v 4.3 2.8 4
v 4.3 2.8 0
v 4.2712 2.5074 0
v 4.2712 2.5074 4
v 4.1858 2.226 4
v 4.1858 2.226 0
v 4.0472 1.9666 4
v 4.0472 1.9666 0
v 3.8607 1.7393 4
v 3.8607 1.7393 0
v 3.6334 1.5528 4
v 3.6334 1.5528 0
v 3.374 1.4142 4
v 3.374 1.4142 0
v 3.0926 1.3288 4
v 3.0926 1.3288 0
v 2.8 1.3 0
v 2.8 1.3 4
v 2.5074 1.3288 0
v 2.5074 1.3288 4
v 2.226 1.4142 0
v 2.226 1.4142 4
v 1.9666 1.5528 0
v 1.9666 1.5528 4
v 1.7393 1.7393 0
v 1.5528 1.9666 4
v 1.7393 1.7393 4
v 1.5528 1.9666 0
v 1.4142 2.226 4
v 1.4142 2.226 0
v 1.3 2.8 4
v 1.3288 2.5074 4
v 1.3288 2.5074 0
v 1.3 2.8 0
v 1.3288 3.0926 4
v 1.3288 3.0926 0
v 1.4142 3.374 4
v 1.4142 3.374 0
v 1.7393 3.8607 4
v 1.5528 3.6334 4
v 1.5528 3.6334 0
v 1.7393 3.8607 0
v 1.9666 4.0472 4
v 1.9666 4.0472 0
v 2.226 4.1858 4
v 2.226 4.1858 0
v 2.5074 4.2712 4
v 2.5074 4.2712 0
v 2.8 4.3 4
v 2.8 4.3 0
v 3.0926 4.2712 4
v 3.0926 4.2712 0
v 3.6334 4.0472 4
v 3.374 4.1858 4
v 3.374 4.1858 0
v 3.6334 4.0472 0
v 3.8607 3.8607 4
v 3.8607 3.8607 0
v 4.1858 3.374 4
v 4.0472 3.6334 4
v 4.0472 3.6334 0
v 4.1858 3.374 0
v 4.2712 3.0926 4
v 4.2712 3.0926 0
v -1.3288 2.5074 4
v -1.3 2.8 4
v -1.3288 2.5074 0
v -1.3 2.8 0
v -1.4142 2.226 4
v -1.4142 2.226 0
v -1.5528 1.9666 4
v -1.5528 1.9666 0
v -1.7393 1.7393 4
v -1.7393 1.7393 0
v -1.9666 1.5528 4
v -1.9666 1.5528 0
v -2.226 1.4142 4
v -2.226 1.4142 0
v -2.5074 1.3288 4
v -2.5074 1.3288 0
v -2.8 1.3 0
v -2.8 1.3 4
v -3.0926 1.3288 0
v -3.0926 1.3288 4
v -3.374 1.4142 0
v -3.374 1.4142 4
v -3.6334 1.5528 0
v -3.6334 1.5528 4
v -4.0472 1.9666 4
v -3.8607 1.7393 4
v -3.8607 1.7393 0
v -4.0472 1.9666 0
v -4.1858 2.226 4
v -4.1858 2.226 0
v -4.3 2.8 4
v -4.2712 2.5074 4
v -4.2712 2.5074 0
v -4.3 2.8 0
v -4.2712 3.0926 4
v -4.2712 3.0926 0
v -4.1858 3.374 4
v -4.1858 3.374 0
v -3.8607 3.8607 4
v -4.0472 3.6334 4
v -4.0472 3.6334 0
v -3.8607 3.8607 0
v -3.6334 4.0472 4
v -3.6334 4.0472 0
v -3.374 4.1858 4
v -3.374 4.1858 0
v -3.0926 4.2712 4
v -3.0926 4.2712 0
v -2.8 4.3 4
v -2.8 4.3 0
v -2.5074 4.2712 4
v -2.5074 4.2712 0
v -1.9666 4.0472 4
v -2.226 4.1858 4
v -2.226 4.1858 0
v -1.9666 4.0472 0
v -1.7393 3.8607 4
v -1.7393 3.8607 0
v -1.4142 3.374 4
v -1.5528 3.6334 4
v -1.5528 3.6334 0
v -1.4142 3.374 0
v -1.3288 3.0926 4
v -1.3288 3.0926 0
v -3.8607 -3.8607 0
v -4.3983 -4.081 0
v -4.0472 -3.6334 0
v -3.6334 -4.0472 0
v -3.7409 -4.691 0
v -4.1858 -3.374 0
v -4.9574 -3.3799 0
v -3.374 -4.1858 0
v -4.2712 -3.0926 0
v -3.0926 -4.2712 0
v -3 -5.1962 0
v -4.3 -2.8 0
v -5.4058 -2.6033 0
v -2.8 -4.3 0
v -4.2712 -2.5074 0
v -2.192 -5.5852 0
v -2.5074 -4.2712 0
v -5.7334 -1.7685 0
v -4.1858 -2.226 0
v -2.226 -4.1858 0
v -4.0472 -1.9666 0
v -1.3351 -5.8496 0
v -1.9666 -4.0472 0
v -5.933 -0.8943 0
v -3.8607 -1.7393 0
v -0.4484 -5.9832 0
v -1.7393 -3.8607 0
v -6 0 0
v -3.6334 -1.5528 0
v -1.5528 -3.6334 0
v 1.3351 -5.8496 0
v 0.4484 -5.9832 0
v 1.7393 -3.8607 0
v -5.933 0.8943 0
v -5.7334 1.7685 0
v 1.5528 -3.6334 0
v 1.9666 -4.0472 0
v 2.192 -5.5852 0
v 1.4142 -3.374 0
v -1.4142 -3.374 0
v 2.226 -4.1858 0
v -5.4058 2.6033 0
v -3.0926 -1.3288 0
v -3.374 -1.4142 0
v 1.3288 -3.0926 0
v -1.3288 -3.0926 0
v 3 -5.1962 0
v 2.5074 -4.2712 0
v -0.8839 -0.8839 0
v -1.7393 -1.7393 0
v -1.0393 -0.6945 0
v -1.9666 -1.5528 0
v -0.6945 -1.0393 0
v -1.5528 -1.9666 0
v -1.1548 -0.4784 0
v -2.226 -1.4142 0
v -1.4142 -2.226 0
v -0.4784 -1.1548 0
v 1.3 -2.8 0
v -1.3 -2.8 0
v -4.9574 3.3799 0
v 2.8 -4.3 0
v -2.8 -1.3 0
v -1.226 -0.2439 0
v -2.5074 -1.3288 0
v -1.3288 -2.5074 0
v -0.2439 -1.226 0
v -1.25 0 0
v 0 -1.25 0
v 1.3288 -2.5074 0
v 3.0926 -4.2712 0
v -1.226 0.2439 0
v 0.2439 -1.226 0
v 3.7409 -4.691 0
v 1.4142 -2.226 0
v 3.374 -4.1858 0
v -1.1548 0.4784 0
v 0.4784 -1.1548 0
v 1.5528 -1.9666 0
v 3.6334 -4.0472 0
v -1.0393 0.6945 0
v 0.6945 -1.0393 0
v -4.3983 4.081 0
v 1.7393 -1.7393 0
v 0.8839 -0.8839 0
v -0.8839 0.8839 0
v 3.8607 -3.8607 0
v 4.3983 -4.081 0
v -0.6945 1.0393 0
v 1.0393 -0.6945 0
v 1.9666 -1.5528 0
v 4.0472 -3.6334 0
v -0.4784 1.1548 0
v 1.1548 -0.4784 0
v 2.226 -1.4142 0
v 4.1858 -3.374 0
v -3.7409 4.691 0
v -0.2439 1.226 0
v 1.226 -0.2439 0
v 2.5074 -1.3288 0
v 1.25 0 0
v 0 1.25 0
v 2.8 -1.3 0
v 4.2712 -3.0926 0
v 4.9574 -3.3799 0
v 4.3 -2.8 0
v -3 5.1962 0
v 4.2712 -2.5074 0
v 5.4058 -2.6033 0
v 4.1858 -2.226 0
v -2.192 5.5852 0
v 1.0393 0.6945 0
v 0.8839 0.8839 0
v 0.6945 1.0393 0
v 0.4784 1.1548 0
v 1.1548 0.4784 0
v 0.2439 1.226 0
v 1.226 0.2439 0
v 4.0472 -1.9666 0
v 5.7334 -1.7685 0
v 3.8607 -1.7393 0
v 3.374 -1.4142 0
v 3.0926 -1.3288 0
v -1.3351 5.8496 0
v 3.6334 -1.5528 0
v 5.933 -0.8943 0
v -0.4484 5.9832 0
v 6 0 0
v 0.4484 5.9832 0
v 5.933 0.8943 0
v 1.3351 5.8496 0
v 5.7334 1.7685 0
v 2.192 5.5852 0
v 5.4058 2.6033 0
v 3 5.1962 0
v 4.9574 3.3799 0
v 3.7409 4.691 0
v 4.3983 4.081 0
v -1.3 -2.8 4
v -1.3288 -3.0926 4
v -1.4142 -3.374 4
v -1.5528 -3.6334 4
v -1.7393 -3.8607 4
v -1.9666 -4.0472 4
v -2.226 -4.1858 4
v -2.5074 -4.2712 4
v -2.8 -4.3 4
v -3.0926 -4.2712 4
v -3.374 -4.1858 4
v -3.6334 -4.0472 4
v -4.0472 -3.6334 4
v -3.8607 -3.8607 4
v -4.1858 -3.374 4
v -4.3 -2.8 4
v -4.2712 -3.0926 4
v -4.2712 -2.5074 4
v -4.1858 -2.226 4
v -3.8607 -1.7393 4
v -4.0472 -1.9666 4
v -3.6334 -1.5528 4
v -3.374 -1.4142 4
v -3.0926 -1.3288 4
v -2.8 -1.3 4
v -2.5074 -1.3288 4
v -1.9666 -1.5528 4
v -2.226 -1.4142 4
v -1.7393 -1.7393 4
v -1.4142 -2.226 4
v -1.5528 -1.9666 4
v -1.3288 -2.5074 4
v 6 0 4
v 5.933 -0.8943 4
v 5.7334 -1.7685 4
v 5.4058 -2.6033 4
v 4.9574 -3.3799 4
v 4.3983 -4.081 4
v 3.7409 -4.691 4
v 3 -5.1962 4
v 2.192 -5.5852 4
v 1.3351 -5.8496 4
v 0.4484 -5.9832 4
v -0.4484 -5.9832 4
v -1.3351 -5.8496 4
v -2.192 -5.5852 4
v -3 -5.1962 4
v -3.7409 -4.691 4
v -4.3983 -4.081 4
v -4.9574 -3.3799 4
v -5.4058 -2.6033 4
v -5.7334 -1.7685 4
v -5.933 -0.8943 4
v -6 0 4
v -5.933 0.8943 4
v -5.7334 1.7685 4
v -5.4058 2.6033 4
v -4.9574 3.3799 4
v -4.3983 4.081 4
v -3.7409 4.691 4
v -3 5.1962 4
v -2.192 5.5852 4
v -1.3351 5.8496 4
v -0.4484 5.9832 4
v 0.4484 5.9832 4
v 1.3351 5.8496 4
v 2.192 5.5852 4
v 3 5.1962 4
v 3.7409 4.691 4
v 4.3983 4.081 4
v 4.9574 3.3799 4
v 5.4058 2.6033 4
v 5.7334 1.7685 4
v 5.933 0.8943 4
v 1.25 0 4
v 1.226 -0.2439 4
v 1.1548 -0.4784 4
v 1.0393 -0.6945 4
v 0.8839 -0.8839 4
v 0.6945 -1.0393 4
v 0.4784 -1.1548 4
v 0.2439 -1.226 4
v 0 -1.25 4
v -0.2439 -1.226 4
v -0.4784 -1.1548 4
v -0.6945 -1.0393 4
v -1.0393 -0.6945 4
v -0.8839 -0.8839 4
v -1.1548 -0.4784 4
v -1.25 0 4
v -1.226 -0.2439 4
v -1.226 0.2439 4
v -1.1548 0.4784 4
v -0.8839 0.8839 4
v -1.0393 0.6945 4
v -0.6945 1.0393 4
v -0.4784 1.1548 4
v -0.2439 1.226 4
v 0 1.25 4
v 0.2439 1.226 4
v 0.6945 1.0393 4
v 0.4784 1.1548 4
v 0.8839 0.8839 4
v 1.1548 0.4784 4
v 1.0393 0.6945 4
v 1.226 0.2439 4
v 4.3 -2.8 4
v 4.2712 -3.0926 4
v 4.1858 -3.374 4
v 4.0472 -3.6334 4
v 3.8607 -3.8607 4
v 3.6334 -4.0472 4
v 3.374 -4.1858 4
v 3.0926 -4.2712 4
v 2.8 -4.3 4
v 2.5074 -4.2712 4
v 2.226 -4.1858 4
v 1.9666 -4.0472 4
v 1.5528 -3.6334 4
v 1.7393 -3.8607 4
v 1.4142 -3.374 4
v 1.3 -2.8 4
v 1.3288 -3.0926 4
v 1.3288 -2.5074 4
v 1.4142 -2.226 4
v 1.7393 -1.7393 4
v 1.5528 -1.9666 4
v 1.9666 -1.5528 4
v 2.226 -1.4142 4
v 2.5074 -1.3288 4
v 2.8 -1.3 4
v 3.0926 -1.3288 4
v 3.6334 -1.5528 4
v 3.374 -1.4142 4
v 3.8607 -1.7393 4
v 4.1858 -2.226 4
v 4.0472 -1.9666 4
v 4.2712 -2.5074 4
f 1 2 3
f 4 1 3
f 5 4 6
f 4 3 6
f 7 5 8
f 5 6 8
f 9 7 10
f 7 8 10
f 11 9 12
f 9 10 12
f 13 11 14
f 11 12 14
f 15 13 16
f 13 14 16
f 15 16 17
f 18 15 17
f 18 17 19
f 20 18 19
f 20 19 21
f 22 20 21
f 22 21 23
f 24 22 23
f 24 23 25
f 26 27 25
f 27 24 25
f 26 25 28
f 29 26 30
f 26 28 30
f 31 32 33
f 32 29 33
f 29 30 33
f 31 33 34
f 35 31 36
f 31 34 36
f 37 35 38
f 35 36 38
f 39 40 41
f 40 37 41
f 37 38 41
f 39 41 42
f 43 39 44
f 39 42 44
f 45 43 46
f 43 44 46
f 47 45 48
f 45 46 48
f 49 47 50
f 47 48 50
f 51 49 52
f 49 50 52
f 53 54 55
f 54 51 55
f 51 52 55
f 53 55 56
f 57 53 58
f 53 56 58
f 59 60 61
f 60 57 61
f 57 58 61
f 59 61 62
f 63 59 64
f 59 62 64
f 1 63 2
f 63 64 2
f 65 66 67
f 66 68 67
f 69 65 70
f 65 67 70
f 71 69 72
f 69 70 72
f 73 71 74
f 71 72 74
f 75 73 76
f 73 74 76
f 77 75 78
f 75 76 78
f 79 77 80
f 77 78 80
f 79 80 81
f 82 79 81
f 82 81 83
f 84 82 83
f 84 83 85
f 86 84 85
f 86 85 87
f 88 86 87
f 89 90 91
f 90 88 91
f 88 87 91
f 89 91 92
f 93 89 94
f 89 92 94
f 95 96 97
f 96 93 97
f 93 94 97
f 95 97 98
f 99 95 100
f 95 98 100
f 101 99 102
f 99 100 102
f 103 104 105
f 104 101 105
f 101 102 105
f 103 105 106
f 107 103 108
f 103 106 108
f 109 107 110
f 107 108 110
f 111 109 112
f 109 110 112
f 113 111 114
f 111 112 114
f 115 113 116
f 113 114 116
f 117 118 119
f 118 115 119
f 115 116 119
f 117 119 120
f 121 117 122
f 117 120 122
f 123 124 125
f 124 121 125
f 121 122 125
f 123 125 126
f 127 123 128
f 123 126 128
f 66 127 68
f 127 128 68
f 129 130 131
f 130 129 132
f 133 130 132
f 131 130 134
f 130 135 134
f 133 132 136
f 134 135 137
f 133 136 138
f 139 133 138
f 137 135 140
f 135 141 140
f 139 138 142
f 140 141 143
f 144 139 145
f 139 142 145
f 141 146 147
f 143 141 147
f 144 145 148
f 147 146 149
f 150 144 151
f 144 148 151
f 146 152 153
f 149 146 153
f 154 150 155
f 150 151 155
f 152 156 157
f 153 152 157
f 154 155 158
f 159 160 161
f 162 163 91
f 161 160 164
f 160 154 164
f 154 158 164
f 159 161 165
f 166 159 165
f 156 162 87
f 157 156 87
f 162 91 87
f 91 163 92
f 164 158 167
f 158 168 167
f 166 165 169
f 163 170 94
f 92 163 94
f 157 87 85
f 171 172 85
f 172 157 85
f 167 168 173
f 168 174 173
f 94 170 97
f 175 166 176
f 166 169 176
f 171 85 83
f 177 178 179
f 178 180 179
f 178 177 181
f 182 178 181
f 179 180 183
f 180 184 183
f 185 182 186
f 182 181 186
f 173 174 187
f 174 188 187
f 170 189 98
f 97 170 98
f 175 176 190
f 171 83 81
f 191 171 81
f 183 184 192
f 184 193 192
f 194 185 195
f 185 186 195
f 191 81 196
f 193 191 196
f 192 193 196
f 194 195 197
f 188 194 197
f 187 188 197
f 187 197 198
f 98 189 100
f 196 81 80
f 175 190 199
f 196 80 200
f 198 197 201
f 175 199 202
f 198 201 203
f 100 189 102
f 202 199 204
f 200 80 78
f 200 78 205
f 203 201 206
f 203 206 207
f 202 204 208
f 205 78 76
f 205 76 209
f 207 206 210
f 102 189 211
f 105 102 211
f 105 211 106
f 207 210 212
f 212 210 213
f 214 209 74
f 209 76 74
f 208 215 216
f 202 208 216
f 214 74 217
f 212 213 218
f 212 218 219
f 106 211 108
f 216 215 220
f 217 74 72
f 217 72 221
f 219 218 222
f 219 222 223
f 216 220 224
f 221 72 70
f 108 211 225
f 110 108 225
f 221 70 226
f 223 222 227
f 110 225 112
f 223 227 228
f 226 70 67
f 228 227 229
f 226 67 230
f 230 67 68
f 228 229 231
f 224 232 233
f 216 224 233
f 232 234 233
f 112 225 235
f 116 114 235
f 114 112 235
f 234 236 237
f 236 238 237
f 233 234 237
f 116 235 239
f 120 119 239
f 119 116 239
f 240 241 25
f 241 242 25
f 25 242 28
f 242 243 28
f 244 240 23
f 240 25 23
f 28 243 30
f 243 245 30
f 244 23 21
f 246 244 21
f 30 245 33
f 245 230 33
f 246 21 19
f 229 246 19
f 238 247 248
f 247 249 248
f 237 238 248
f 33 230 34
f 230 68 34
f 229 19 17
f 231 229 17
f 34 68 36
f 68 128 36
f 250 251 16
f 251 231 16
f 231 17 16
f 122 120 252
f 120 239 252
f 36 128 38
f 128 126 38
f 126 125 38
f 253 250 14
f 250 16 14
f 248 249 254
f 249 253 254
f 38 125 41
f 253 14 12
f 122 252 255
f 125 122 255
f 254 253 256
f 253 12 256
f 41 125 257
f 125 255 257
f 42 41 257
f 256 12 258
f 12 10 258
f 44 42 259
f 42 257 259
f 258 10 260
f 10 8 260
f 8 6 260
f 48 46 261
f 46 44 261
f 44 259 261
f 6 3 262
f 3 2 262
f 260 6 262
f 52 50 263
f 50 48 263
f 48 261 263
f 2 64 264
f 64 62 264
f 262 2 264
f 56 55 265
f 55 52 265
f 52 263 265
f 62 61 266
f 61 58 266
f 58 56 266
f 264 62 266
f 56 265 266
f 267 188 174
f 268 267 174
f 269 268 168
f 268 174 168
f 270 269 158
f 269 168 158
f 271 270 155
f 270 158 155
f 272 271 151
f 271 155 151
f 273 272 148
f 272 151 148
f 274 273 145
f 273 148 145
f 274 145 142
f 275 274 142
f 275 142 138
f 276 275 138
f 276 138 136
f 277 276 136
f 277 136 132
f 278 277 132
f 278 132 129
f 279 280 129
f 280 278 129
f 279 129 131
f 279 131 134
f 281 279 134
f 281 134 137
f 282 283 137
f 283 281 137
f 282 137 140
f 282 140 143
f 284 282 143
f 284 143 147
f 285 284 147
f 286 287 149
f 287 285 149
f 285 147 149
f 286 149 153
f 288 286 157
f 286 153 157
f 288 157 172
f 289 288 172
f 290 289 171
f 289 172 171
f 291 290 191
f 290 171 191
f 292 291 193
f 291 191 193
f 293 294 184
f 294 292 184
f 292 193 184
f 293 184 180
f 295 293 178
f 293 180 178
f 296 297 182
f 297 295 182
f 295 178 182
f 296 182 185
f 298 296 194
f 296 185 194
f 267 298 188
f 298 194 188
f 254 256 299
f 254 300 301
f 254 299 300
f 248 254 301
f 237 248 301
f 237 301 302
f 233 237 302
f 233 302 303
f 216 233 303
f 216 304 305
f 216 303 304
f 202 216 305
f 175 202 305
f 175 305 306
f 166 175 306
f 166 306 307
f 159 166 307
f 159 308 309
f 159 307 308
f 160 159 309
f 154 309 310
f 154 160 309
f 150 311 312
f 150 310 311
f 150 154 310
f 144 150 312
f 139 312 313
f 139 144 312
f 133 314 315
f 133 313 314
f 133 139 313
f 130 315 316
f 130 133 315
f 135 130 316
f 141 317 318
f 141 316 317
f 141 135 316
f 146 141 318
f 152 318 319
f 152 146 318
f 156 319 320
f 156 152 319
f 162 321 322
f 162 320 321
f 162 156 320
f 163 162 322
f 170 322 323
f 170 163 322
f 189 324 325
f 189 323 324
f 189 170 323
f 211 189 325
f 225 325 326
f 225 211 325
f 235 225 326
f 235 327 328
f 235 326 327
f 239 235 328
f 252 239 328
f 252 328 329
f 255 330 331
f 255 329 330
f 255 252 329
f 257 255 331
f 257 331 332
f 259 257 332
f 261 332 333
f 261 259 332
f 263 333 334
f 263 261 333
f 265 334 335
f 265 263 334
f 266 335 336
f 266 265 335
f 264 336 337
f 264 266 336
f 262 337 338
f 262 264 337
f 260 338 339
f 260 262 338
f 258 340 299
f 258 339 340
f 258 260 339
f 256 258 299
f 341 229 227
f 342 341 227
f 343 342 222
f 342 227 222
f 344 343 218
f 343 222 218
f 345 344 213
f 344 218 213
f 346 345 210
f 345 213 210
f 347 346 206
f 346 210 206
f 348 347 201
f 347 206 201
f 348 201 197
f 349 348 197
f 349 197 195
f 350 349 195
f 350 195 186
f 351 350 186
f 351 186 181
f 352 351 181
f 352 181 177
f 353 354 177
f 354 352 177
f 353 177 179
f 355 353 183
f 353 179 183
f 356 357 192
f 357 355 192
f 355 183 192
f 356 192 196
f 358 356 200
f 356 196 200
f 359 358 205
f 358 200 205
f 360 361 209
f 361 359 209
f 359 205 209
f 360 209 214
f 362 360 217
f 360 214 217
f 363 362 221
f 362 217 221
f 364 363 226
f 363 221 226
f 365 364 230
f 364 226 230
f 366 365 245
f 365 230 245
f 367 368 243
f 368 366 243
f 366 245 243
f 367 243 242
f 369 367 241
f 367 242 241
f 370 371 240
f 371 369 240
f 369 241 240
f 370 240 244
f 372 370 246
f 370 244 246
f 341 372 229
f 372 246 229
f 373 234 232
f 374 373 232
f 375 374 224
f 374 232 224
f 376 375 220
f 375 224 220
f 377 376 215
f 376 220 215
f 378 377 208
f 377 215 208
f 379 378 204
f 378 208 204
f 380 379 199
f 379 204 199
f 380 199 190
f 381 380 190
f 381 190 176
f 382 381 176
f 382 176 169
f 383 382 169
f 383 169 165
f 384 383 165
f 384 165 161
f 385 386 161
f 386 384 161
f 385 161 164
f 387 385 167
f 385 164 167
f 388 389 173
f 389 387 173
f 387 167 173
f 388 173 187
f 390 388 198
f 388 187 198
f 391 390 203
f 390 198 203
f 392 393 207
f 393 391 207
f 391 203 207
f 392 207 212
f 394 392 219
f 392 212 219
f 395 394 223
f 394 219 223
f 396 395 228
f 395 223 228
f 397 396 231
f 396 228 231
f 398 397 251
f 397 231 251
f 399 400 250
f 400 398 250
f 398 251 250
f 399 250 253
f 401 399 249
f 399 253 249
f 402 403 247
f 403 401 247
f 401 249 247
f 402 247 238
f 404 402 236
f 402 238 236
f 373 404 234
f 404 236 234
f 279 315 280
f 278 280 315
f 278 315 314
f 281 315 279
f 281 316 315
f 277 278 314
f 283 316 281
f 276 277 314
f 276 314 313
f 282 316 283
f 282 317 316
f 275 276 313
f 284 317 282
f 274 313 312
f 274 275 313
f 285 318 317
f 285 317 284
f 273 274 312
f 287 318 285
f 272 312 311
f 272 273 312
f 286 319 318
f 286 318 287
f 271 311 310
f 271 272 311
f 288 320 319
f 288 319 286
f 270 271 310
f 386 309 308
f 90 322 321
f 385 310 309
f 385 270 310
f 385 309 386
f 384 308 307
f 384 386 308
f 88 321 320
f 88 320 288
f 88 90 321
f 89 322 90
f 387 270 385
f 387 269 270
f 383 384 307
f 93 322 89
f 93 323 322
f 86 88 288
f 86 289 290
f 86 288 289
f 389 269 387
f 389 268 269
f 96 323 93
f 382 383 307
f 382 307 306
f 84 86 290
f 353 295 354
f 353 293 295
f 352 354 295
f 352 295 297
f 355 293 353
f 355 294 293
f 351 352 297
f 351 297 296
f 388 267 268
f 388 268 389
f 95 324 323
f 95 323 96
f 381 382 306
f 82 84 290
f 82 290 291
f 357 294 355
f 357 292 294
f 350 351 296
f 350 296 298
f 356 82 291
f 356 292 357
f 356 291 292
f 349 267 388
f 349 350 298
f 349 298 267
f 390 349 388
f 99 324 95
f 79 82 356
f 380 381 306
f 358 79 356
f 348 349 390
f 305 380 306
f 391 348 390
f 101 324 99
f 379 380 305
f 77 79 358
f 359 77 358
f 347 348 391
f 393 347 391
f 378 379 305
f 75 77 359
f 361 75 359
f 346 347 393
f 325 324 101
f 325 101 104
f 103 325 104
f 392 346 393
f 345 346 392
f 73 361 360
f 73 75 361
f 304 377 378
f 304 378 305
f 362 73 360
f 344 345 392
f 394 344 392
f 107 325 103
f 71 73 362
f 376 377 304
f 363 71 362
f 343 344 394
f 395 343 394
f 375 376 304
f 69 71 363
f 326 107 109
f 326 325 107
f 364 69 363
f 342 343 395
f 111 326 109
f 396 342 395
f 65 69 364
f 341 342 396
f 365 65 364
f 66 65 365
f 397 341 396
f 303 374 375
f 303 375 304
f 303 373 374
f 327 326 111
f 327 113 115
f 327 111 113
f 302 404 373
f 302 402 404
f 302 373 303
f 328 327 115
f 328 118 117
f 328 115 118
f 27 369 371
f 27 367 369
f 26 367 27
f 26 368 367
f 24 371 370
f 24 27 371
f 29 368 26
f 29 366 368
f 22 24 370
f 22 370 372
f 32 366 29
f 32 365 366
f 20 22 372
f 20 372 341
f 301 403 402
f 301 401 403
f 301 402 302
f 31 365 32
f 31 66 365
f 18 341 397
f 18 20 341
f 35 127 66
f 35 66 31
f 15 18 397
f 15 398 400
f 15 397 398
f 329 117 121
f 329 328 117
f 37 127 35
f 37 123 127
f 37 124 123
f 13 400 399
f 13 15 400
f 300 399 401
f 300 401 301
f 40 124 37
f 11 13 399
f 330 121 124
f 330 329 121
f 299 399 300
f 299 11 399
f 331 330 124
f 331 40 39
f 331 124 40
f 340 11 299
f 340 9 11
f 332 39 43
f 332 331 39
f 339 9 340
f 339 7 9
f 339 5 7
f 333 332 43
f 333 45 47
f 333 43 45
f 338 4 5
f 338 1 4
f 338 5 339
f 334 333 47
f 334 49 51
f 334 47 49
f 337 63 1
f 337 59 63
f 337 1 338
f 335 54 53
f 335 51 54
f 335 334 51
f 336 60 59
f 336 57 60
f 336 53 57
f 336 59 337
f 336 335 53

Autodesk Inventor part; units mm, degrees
ref_plane "YZ Plane" through (0, 0, 0) normal (1, 0, 0) x (0, 1, 0)
ref_plane "XZ Plane" through (0, 0, 0) normal (0, 1, 0) x (-1, 0, 0)
ref_plane "XY Plane" through (0, 0, 0) normal (0, 0, 1) x (1, 0, 0)
sketch "スケッチ1" plane through (0, 0, 0) normal (0, 0, 1) x (1, 0, 0)
  circle A0 centre (0, 0) radius 8
  circle A1 centre (0, 0) radius 6
  circle A2 centre (0, 0) radius 1.25
  circle A3 centre (-2.8, -2.8) radius 1.5
  circle A4 centre (-2.8, 2.8) radius 1.5
  circle A5 centre (2.8, 2.8) radius 1.5
  circle A6 centre (2.8, -2.8) radius 1.5
  circle A7 centre (0, 0) radius 6
  dimension "d0" = 16
  dimension "d1" = 12
extrude "押し出し1" add sketch "スケッチ1" along normal blind 4 contours A1
properties part number "新型３脚最終段カム" material "アルミニウム 2014-T4"
